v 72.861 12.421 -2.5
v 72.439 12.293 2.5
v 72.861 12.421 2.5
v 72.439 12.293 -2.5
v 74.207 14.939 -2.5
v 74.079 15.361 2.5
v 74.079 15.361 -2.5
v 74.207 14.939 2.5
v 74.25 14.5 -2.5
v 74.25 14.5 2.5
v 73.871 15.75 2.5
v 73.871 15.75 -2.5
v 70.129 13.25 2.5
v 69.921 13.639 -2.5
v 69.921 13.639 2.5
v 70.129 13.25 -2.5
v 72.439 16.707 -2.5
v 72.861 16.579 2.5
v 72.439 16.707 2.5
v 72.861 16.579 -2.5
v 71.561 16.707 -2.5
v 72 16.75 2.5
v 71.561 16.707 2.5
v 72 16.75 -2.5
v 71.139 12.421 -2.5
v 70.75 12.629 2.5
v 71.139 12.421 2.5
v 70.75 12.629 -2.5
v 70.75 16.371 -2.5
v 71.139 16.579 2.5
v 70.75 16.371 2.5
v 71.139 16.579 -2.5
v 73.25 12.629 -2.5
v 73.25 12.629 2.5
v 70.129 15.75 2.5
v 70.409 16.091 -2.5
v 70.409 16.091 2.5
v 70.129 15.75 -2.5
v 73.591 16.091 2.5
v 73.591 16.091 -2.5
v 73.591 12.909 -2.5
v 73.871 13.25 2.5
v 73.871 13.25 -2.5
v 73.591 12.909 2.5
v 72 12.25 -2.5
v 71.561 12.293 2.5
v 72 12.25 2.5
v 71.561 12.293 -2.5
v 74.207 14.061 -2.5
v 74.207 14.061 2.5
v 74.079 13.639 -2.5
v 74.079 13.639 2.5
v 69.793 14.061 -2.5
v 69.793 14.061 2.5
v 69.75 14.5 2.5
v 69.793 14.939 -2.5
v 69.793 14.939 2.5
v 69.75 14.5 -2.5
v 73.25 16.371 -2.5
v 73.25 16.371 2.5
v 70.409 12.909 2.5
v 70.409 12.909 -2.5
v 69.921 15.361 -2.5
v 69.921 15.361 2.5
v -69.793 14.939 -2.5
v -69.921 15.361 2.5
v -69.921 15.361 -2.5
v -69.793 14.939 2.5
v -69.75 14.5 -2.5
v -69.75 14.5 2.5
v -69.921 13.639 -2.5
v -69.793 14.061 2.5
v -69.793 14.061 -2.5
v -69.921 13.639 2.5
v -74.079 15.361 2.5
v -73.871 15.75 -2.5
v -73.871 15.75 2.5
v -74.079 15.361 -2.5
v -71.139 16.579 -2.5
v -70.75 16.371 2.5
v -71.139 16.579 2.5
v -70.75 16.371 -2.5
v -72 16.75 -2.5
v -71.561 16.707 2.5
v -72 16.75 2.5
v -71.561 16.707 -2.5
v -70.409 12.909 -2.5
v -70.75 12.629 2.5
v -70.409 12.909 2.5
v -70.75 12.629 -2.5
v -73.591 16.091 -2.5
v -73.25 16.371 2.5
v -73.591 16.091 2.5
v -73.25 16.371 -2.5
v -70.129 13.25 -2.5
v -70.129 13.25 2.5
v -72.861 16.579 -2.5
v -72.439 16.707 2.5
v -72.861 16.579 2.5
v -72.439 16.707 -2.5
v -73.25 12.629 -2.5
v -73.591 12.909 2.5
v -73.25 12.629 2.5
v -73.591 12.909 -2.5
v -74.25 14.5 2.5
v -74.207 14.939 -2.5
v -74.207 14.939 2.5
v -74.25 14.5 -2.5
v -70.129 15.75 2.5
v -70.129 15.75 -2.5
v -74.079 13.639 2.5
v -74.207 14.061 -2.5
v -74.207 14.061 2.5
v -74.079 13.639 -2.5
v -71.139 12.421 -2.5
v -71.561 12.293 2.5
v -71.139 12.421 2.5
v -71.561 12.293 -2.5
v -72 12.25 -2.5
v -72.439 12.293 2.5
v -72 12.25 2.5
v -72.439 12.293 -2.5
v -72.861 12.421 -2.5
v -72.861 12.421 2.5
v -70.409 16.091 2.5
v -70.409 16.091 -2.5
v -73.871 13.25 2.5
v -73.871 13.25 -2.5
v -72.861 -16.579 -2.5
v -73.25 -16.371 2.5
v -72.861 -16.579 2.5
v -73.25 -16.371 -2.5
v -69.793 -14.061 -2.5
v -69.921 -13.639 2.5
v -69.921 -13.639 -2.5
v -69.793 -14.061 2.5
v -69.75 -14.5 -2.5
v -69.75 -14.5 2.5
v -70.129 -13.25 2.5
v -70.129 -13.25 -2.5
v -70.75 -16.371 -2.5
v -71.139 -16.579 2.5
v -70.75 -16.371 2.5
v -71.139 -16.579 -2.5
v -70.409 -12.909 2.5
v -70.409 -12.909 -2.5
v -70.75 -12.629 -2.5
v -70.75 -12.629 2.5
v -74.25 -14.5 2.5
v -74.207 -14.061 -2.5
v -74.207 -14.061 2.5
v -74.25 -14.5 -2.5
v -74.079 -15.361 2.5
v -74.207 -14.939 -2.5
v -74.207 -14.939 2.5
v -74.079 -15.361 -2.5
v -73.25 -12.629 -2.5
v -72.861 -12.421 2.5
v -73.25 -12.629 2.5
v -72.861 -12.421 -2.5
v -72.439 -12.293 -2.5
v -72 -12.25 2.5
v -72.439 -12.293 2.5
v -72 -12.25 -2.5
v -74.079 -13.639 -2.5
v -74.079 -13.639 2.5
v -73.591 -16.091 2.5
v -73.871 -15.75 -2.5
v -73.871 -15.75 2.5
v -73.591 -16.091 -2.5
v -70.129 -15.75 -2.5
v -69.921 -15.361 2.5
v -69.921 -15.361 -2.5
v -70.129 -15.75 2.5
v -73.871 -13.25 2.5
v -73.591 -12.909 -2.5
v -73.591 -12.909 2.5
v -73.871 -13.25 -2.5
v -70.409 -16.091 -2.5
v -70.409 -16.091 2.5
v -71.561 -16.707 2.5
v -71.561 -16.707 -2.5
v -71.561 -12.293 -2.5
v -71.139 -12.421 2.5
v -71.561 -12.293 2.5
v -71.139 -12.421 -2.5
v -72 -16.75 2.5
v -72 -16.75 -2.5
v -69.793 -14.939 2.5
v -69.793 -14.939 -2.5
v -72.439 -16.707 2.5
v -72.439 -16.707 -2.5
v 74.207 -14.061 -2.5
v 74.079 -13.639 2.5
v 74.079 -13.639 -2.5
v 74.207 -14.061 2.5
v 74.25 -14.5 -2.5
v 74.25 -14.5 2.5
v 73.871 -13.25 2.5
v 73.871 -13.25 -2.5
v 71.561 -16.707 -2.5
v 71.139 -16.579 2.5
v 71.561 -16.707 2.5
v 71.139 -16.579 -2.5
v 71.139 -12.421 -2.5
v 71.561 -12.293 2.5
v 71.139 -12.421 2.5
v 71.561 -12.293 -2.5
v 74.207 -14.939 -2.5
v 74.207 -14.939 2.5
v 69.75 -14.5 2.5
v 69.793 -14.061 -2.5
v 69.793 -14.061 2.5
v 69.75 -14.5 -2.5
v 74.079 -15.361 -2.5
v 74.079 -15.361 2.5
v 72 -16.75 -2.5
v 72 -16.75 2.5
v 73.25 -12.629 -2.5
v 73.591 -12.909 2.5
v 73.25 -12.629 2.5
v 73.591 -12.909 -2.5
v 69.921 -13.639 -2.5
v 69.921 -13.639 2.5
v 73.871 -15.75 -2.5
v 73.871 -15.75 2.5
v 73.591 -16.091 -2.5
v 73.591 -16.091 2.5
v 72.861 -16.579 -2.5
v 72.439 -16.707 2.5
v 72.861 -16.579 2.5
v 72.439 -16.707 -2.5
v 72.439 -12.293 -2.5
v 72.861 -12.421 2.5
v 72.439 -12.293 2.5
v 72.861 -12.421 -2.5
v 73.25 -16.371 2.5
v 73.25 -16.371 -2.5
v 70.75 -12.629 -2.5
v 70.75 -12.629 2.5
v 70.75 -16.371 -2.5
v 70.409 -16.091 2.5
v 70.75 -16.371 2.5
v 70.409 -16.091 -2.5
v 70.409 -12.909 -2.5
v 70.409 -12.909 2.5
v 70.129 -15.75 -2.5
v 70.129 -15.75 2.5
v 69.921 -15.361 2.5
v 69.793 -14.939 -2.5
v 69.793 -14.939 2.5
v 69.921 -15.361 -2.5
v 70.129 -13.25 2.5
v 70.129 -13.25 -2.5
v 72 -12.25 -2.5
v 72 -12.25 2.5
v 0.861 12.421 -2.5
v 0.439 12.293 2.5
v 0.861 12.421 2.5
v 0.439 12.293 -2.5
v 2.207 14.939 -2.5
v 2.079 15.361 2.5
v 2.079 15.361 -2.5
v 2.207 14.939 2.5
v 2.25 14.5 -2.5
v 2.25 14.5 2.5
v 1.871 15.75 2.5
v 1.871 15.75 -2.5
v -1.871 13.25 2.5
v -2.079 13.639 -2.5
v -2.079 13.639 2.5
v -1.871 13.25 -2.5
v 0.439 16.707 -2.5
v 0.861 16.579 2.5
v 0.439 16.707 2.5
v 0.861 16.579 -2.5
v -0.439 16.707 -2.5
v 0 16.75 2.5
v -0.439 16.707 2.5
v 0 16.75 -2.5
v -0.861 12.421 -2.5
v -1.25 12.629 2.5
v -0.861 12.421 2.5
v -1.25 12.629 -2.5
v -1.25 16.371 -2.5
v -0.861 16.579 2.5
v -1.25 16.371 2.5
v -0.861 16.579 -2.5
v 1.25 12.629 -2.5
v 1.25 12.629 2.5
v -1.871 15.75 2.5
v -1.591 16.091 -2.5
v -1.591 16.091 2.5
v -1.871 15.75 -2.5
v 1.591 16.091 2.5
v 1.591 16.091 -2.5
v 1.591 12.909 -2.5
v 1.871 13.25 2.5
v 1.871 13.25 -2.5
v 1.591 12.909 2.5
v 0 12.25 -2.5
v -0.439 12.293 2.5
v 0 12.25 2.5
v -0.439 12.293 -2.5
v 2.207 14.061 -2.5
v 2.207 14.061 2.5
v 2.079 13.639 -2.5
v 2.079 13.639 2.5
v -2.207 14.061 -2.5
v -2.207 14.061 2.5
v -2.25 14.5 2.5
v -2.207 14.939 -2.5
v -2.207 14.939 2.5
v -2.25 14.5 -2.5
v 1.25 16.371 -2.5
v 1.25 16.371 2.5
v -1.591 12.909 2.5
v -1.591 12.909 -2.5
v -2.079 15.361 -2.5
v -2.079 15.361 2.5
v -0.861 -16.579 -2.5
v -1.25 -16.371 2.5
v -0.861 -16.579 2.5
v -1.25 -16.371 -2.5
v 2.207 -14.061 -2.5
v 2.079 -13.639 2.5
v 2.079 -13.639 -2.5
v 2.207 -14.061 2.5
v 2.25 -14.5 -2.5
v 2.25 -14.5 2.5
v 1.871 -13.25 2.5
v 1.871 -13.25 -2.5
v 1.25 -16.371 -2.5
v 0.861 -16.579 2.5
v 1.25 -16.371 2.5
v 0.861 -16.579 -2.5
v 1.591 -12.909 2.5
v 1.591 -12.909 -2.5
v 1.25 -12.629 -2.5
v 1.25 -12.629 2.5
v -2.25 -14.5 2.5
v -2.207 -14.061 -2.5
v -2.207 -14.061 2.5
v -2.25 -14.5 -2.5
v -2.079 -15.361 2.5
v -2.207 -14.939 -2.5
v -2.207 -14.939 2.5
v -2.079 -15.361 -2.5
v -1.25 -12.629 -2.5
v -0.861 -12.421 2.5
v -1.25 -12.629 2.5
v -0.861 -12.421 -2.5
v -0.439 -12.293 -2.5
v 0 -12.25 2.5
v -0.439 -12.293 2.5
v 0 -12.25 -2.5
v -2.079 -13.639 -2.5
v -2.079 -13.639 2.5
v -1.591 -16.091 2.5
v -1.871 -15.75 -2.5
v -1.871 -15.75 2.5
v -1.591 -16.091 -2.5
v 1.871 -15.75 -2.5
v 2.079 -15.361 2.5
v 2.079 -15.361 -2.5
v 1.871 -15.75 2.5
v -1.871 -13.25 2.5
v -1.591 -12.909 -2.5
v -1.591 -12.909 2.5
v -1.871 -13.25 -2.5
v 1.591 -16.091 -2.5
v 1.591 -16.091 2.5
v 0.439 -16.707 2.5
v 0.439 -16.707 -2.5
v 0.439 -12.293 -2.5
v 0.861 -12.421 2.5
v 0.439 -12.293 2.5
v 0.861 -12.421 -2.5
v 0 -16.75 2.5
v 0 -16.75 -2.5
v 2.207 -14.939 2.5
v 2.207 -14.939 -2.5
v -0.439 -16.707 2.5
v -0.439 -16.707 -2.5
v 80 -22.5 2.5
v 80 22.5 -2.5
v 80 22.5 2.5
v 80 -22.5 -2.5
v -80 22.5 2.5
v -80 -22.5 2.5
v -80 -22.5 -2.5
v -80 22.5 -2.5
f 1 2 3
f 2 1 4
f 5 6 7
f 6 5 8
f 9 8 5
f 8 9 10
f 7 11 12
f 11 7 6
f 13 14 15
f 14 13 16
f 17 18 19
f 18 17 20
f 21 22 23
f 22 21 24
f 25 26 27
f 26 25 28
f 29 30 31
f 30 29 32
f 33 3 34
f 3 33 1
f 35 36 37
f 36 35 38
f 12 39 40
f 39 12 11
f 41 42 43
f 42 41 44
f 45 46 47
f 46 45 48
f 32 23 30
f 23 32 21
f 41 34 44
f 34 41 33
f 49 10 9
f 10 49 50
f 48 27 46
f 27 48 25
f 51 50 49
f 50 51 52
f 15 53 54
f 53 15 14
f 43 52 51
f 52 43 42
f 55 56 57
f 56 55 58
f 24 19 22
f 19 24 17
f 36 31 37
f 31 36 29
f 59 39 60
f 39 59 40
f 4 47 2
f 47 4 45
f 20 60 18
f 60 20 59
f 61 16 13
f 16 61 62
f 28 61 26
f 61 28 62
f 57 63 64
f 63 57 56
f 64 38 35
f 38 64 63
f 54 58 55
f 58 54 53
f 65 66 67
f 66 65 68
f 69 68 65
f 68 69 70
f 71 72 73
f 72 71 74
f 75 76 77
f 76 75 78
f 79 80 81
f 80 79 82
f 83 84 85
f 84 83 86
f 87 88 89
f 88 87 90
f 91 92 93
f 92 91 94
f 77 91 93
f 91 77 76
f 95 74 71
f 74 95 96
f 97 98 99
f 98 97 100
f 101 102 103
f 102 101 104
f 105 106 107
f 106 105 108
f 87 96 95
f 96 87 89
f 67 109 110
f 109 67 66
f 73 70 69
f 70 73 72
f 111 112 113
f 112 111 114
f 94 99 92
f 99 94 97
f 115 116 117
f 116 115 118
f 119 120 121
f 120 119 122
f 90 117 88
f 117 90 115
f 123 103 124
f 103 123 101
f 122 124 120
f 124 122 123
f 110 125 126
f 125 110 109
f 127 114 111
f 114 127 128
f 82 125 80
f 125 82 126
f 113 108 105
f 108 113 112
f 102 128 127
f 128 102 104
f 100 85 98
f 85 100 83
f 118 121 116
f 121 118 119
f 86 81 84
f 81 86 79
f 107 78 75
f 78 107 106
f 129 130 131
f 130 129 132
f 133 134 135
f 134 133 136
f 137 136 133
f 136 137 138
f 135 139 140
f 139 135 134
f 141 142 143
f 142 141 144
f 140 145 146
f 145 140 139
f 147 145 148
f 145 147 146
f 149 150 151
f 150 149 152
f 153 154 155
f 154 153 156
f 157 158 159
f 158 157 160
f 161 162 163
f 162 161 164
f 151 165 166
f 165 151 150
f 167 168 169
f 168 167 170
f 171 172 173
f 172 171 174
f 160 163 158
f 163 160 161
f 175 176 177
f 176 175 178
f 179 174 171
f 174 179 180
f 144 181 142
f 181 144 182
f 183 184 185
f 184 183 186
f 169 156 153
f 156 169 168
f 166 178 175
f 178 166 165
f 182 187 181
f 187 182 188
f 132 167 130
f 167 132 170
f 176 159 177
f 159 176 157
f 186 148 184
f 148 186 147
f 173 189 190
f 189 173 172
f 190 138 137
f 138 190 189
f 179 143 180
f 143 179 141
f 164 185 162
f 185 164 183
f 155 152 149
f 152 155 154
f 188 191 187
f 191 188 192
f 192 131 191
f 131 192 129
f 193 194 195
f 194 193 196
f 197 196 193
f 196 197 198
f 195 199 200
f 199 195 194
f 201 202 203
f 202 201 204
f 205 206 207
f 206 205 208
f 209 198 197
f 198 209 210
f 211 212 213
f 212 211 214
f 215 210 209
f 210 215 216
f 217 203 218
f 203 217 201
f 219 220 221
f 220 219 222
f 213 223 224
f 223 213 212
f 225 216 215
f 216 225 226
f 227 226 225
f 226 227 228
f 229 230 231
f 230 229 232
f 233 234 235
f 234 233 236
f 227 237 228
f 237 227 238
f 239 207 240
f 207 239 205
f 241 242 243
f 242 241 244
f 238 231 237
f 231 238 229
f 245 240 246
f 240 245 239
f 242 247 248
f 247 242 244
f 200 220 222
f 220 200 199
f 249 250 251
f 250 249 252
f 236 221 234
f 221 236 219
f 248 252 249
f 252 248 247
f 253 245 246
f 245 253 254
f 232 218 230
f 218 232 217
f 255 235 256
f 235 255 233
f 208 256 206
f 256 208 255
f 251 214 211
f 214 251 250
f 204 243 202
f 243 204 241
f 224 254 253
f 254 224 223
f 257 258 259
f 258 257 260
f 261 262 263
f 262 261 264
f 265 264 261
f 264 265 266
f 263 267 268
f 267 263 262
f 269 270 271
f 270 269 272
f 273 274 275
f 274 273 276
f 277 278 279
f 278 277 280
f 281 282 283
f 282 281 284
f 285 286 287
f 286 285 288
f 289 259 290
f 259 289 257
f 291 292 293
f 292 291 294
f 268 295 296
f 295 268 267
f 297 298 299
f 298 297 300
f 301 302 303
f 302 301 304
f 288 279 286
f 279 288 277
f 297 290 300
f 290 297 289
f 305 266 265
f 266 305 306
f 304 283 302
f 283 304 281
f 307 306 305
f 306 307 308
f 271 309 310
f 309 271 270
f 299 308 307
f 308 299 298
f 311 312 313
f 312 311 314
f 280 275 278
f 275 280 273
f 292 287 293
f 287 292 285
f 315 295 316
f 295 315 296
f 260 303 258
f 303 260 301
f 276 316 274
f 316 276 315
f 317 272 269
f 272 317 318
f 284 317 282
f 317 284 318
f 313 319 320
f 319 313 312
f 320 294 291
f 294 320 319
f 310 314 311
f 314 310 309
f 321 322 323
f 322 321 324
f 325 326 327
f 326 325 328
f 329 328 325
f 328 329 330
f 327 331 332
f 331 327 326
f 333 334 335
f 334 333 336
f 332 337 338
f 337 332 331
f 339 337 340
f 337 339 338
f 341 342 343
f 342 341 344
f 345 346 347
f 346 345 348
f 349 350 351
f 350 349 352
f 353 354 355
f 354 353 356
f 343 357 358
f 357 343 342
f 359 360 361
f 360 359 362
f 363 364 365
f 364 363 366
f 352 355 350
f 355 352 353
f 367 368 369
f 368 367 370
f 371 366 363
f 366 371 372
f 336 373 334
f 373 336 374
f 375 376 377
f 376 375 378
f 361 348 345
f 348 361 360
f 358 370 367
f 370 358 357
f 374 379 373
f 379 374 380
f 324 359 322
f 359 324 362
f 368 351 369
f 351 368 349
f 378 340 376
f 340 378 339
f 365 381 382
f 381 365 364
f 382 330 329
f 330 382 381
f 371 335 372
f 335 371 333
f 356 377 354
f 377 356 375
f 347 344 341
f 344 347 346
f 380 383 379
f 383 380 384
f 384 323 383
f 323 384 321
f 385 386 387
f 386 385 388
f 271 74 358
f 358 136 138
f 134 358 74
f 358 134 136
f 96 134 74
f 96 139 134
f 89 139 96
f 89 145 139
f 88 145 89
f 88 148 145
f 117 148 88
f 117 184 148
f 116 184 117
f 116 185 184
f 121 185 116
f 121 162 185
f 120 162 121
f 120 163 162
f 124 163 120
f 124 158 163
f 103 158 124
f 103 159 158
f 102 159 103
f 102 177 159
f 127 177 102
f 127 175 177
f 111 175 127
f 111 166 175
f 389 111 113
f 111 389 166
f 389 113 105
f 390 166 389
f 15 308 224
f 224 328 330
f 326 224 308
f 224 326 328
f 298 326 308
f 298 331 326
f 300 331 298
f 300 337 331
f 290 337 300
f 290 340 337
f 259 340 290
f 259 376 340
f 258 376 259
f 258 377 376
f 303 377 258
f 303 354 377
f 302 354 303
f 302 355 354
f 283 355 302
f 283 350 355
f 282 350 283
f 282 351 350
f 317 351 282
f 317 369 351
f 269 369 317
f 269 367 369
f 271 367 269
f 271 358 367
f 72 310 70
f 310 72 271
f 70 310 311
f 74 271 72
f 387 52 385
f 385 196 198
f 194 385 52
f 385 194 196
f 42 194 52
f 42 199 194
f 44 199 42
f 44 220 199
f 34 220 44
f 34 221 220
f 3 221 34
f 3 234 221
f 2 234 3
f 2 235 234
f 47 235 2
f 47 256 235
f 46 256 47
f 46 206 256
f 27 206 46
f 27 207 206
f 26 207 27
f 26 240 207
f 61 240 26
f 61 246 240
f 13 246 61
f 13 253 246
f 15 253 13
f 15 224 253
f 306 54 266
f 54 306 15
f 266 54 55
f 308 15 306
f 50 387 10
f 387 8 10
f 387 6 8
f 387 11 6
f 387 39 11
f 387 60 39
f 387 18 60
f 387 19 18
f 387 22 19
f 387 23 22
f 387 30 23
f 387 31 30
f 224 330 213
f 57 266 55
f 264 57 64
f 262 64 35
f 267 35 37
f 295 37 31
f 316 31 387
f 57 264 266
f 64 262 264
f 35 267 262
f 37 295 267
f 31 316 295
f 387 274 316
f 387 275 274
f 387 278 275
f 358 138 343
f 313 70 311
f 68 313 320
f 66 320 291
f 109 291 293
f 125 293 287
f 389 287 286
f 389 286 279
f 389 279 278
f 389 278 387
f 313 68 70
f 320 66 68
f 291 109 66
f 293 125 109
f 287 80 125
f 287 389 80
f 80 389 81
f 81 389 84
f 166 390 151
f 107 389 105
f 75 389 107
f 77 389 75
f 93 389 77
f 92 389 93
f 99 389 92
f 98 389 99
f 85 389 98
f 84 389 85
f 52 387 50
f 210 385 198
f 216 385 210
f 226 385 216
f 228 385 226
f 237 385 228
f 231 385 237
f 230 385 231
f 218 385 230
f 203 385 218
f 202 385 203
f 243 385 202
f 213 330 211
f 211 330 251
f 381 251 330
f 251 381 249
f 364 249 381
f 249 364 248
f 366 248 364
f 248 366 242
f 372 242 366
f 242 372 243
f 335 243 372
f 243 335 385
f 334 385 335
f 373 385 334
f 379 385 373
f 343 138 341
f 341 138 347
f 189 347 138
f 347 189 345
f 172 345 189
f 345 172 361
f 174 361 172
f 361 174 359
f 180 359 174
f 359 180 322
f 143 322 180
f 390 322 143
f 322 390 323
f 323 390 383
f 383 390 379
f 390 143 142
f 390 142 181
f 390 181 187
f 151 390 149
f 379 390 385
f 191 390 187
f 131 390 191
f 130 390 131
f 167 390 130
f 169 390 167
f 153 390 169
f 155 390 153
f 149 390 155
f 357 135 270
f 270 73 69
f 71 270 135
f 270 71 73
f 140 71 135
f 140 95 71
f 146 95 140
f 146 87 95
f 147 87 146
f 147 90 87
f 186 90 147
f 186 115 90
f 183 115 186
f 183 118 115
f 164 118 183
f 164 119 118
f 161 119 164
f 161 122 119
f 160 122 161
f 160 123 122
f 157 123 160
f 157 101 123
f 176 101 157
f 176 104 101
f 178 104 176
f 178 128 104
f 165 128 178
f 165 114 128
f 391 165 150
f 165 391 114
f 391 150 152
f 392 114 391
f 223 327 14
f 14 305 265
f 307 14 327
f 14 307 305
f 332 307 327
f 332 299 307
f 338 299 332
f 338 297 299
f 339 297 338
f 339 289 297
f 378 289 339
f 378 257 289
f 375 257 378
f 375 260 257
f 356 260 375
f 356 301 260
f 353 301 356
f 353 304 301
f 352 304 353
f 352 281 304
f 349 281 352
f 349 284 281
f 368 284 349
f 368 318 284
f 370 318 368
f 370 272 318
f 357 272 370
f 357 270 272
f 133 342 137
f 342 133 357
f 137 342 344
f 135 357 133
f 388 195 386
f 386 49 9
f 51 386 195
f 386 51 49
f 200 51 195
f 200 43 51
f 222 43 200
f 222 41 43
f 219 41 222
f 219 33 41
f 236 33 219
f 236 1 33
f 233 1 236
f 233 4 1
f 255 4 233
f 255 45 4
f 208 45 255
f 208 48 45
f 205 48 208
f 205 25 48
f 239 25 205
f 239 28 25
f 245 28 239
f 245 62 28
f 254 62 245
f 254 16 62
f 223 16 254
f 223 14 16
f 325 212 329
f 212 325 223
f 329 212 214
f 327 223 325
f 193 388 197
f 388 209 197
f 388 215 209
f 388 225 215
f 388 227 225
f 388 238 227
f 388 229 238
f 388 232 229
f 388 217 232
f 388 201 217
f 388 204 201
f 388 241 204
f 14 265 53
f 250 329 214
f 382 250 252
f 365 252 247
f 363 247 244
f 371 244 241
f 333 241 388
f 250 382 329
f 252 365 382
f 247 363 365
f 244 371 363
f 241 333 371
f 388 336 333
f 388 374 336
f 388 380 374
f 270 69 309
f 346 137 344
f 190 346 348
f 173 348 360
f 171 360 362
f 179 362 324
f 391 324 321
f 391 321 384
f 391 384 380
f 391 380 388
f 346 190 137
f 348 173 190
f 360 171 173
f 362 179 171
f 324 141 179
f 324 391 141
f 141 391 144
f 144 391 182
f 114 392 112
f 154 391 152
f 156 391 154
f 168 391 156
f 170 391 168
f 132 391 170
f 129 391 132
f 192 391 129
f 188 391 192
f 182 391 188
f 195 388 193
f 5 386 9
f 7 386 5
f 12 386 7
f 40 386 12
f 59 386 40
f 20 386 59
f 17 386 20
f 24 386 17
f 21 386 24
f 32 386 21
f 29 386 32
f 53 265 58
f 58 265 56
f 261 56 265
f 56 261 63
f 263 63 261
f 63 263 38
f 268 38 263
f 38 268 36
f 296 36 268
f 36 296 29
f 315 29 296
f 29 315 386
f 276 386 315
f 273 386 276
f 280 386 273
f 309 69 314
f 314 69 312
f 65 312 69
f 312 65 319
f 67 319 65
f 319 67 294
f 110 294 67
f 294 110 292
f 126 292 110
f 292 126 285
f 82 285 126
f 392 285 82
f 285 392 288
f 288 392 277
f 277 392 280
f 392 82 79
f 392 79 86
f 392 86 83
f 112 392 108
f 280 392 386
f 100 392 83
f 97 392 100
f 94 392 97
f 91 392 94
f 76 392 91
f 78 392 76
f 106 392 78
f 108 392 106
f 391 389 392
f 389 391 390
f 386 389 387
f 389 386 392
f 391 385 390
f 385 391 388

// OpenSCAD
$fn = 32;

// ----------------------------------------------------------------------
// Corner plate 160 x 45 x 5
// 6 holes, centres taken from the edge offset
// ----------------------------------------------------------------------

// --- parameters (mm) ---
plate = [160, 45, 5];  // overall size (x, y, z)
holes = 6;             // number of holes the drawing asks for
hole_d = 4.5;          // hole diameter
edge = 8;              // hole centre offset from the plate edge

// --- derived feature positions (mm) ---
corner_x = plate[0] / 2 - edge;  // = 72   corner hole X
corner_y = plate[1] / 2 - edge;  // = 14.5   corner hole Y
feature_centers = [
  [corner_x, corner_y],
  [-corner_x, corner_y],
  [-corner_x, -corner_y],
  [corner_x, -corner_y],
  [0, corner_y],
  [0, -corner_y]
];   // hole centres the loop below drills

// plate outline, every hole drilled through with the same cutters
difference() {
  cube(plate, center = true);
  for (centre = feature_centers)
    translate([centre[0], centre[1], 0])
      cylinder(d = hole_d, h = plate[2] + 2, center = true);
}
